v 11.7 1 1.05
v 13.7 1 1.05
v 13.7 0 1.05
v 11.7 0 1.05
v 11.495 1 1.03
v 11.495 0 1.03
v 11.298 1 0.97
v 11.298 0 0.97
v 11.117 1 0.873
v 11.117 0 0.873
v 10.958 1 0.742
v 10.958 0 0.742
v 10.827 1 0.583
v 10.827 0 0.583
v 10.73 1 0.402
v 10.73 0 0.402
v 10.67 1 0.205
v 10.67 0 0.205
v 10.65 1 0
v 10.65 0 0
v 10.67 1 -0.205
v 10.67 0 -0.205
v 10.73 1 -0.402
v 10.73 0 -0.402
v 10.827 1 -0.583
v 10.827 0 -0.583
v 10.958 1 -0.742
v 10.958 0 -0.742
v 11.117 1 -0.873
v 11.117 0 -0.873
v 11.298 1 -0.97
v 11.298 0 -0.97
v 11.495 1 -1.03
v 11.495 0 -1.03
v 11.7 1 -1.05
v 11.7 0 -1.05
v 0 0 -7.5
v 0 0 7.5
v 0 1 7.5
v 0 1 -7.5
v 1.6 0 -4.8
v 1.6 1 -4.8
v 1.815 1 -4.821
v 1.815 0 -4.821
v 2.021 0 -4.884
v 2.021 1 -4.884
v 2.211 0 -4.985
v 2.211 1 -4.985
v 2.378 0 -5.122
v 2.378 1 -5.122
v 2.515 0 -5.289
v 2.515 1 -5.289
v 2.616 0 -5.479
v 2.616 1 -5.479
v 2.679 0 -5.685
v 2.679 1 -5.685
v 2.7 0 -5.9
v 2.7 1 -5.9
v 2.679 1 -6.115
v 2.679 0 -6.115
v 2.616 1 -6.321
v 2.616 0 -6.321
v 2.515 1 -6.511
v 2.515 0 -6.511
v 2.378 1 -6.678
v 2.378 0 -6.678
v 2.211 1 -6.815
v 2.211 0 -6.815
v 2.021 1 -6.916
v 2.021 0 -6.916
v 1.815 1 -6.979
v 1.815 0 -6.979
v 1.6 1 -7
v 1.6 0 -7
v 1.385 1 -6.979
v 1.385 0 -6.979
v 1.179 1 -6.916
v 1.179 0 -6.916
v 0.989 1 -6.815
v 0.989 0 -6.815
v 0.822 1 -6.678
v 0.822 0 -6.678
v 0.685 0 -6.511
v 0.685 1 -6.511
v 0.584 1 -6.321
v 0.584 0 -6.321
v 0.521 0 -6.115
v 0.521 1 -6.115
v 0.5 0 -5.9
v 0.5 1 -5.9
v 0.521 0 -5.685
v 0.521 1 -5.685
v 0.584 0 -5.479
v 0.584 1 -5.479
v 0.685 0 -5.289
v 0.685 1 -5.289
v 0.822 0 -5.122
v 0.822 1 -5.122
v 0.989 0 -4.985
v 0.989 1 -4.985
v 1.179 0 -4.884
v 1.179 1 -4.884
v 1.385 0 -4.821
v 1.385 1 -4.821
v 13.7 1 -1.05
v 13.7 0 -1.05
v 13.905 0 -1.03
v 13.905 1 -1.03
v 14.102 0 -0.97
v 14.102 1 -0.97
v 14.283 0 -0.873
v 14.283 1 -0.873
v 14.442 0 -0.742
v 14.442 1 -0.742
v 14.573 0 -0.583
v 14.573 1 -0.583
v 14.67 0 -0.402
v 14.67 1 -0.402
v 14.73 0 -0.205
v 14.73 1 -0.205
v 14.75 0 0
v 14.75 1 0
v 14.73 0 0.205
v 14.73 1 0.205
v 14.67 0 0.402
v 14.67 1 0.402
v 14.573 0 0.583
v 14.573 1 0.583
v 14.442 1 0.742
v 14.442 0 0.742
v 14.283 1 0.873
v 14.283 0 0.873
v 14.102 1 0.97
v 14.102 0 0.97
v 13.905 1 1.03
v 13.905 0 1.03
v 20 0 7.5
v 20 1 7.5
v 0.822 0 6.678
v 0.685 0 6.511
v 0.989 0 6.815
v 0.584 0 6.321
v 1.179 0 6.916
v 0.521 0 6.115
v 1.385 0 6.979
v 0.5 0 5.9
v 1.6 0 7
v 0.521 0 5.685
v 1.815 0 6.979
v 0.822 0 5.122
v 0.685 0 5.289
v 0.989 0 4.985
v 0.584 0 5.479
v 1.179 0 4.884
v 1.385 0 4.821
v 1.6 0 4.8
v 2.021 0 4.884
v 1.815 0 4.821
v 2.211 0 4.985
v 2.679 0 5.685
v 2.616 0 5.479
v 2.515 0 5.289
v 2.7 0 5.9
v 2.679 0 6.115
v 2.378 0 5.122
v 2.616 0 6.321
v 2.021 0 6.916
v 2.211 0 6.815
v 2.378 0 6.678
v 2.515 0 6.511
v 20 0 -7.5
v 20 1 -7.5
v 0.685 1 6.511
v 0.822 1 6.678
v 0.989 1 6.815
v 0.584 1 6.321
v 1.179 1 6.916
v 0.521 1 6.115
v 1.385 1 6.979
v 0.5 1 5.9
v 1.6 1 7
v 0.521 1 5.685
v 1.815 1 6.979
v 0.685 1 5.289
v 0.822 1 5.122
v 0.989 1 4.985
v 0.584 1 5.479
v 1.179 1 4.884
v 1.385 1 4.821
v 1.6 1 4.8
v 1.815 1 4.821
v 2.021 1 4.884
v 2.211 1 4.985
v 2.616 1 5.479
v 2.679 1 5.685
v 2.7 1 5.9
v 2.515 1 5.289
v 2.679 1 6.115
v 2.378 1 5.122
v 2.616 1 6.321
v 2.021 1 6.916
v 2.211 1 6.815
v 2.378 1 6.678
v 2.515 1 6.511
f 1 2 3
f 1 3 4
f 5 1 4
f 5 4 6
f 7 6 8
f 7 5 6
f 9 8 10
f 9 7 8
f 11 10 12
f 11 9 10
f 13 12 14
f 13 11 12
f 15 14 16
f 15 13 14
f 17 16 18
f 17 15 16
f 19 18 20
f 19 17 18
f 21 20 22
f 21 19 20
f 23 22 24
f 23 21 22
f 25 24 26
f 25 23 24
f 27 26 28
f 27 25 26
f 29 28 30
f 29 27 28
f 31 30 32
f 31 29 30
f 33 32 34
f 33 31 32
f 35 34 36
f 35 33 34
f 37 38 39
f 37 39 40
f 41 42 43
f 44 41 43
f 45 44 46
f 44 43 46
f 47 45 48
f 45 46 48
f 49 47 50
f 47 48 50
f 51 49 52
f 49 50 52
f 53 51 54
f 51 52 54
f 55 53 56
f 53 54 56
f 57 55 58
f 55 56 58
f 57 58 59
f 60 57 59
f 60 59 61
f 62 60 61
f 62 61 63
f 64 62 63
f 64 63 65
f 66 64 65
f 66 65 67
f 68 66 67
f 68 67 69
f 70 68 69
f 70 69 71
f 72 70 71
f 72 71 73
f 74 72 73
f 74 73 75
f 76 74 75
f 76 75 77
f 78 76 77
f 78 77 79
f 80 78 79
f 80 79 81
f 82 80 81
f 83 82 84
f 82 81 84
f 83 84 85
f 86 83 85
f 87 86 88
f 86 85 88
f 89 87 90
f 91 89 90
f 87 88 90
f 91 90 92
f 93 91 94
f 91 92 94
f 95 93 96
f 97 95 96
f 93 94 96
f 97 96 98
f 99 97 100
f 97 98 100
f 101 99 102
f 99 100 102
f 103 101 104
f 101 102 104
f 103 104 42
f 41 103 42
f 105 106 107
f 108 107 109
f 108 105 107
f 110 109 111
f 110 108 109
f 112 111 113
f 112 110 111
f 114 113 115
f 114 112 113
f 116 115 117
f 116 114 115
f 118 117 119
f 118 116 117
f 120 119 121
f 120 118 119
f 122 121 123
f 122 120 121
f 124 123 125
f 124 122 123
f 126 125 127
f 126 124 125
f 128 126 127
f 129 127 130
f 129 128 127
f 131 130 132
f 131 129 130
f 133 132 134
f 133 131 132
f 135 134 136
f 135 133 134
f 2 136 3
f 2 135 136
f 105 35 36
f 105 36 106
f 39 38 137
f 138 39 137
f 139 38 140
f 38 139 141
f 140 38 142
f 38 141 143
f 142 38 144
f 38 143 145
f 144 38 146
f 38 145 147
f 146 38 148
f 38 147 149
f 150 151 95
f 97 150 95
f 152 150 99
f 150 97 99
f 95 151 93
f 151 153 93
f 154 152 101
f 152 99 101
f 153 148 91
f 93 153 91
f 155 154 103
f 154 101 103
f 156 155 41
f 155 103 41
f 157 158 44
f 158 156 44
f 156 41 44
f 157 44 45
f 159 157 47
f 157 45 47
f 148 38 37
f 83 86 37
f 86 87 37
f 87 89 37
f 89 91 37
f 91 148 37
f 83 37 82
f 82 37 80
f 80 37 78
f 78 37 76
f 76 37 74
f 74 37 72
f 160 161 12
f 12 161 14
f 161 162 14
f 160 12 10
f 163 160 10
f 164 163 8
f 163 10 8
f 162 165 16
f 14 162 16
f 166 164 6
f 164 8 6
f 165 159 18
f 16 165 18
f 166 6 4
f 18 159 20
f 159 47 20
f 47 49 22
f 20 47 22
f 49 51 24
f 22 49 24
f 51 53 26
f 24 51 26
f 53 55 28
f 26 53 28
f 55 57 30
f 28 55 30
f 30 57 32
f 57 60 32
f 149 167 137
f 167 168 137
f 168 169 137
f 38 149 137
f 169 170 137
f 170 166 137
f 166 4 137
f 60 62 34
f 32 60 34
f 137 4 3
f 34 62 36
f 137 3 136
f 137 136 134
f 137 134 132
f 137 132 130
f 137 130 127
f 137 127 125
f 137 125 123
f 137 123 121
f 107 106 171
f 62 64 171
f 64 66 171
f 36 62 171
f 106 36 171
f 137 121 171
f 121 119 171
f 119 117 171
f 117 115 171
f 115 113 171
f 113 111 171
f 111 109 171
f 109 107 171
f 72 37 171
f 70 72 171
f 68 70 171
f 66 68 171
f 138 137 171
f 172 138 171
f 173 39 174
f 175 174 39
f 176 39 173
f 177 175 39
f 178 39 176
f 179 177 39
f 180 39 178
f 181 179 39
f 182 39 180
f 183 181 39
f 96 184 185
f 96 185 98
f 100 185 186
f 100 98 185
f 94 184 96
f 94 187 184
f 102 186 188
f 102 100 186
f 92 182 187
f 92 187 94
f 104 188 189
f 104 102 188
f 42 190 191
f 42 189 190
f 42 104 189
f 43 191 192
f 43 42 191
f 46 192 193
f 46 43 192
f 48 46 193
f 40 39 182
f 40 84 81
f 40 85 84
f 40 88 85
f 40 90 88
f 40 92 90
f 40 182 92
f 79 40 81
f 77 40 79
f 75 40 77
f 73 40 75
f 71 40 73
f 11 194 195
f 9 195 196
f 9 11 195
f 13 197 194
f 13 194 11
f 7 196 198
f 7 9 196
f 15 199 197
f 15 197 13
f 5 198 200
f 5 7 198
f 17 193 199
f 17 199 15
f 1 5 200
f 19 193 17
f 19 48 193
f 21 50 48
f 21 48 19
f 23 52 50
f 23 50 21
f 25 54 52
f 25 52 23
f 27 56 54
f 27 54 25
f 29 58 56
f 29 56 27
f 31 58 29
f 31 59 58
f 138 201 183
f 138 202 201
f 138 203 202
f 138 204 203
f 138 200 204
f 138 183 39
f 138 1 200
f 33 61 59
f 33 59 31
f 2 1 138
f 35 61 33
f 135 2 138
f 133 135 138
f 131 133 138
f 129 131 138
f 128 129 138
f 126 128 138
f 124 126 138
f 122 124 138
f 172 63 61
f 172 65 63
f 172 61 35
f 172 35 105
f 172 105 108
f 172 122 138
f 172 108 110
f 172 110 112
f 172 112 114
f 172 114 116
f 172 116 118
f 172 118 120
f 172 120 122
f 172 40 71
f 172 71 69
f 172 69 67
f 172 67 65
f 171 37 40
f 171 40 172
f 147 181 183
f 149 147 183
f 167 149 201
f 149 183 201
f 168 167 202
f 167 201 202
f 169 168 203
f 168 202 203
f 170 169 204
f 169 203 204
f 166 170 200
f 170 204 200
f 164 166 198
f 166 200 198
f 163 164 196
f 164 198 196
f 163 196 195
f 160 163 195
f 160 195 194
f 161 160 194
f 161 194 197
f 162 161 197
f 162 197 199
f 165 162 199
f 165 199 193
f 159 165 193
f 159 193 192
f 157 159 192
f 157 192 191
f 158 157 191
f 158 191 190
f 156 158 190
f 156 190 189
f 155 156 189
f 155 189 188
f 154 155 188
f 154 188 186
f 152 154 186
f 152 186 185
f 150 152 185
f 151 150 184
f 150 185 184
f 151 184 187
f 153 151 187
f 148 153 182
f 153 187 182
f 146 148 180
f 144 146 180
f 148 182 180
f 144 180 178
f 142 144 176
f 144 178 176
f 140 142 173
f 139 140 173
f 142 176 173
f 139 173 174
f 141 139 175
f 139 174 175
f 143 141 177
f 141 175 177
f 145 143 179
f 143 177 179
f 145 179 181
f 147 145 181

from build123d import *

# Parameters (mm, degrees)
ESQUISSE1_W             = 20
ESQUISSE1_H             = 15
BOSS_EXTRU_1_DEPTH      = 1
ESQUISSE2_R             = 1.1
ENL_V_MAT_EXTRU_1_DEPTH = 22.38340478


with BuildPart() as part:
    # Esquisse1 → Boss.-Extru.1 (new body)
    with BuildSketch(Plane(origin=(0, 0, 0), x_dir=(1, 0, 0), z_dir=(0, 1, 0))):
        with Locations((10, 0)):
            Rectangle(ESQUISSE1_W, ESQUISSE1_H)
    extrude(amount=BOSS_EXTRU_1_DEPTH)

    # Esquisse2 → Enlèv. mat.-Extru.1 (cut, through all)
    with BuildSketch(Plane(origin=(0, 1, 0), x_dir=(1, 0, 0), z_dir=(0, 1, 0))):
        with Locations(Location((1.6, 5.9, 0), (0, 0, 270))):
            Circle(ESQUISSE2_R)
        with Locations(Location((1.6, -5.9, 0), (0, 0, 270))):
            Circle(ESQUISSE2_R)
        with BuildLine():
            Line((11.7, 1.05), (13.7, 1.05))
            ThreePointArc((13.7, 1.05), (14.75, 0), (13.7, -1.05))
            Line((13.7, -1.05), (11.7, -1.05))
            ThreePointArc((11.7, -1.05), (10.65, 0), (11.7, 1.05))
        make_face()
    extrude(amount=-ENL_V_MAT_EXTRU_1_DEPTH, mode=Mode.SUBTRACT)


solid = part.part
